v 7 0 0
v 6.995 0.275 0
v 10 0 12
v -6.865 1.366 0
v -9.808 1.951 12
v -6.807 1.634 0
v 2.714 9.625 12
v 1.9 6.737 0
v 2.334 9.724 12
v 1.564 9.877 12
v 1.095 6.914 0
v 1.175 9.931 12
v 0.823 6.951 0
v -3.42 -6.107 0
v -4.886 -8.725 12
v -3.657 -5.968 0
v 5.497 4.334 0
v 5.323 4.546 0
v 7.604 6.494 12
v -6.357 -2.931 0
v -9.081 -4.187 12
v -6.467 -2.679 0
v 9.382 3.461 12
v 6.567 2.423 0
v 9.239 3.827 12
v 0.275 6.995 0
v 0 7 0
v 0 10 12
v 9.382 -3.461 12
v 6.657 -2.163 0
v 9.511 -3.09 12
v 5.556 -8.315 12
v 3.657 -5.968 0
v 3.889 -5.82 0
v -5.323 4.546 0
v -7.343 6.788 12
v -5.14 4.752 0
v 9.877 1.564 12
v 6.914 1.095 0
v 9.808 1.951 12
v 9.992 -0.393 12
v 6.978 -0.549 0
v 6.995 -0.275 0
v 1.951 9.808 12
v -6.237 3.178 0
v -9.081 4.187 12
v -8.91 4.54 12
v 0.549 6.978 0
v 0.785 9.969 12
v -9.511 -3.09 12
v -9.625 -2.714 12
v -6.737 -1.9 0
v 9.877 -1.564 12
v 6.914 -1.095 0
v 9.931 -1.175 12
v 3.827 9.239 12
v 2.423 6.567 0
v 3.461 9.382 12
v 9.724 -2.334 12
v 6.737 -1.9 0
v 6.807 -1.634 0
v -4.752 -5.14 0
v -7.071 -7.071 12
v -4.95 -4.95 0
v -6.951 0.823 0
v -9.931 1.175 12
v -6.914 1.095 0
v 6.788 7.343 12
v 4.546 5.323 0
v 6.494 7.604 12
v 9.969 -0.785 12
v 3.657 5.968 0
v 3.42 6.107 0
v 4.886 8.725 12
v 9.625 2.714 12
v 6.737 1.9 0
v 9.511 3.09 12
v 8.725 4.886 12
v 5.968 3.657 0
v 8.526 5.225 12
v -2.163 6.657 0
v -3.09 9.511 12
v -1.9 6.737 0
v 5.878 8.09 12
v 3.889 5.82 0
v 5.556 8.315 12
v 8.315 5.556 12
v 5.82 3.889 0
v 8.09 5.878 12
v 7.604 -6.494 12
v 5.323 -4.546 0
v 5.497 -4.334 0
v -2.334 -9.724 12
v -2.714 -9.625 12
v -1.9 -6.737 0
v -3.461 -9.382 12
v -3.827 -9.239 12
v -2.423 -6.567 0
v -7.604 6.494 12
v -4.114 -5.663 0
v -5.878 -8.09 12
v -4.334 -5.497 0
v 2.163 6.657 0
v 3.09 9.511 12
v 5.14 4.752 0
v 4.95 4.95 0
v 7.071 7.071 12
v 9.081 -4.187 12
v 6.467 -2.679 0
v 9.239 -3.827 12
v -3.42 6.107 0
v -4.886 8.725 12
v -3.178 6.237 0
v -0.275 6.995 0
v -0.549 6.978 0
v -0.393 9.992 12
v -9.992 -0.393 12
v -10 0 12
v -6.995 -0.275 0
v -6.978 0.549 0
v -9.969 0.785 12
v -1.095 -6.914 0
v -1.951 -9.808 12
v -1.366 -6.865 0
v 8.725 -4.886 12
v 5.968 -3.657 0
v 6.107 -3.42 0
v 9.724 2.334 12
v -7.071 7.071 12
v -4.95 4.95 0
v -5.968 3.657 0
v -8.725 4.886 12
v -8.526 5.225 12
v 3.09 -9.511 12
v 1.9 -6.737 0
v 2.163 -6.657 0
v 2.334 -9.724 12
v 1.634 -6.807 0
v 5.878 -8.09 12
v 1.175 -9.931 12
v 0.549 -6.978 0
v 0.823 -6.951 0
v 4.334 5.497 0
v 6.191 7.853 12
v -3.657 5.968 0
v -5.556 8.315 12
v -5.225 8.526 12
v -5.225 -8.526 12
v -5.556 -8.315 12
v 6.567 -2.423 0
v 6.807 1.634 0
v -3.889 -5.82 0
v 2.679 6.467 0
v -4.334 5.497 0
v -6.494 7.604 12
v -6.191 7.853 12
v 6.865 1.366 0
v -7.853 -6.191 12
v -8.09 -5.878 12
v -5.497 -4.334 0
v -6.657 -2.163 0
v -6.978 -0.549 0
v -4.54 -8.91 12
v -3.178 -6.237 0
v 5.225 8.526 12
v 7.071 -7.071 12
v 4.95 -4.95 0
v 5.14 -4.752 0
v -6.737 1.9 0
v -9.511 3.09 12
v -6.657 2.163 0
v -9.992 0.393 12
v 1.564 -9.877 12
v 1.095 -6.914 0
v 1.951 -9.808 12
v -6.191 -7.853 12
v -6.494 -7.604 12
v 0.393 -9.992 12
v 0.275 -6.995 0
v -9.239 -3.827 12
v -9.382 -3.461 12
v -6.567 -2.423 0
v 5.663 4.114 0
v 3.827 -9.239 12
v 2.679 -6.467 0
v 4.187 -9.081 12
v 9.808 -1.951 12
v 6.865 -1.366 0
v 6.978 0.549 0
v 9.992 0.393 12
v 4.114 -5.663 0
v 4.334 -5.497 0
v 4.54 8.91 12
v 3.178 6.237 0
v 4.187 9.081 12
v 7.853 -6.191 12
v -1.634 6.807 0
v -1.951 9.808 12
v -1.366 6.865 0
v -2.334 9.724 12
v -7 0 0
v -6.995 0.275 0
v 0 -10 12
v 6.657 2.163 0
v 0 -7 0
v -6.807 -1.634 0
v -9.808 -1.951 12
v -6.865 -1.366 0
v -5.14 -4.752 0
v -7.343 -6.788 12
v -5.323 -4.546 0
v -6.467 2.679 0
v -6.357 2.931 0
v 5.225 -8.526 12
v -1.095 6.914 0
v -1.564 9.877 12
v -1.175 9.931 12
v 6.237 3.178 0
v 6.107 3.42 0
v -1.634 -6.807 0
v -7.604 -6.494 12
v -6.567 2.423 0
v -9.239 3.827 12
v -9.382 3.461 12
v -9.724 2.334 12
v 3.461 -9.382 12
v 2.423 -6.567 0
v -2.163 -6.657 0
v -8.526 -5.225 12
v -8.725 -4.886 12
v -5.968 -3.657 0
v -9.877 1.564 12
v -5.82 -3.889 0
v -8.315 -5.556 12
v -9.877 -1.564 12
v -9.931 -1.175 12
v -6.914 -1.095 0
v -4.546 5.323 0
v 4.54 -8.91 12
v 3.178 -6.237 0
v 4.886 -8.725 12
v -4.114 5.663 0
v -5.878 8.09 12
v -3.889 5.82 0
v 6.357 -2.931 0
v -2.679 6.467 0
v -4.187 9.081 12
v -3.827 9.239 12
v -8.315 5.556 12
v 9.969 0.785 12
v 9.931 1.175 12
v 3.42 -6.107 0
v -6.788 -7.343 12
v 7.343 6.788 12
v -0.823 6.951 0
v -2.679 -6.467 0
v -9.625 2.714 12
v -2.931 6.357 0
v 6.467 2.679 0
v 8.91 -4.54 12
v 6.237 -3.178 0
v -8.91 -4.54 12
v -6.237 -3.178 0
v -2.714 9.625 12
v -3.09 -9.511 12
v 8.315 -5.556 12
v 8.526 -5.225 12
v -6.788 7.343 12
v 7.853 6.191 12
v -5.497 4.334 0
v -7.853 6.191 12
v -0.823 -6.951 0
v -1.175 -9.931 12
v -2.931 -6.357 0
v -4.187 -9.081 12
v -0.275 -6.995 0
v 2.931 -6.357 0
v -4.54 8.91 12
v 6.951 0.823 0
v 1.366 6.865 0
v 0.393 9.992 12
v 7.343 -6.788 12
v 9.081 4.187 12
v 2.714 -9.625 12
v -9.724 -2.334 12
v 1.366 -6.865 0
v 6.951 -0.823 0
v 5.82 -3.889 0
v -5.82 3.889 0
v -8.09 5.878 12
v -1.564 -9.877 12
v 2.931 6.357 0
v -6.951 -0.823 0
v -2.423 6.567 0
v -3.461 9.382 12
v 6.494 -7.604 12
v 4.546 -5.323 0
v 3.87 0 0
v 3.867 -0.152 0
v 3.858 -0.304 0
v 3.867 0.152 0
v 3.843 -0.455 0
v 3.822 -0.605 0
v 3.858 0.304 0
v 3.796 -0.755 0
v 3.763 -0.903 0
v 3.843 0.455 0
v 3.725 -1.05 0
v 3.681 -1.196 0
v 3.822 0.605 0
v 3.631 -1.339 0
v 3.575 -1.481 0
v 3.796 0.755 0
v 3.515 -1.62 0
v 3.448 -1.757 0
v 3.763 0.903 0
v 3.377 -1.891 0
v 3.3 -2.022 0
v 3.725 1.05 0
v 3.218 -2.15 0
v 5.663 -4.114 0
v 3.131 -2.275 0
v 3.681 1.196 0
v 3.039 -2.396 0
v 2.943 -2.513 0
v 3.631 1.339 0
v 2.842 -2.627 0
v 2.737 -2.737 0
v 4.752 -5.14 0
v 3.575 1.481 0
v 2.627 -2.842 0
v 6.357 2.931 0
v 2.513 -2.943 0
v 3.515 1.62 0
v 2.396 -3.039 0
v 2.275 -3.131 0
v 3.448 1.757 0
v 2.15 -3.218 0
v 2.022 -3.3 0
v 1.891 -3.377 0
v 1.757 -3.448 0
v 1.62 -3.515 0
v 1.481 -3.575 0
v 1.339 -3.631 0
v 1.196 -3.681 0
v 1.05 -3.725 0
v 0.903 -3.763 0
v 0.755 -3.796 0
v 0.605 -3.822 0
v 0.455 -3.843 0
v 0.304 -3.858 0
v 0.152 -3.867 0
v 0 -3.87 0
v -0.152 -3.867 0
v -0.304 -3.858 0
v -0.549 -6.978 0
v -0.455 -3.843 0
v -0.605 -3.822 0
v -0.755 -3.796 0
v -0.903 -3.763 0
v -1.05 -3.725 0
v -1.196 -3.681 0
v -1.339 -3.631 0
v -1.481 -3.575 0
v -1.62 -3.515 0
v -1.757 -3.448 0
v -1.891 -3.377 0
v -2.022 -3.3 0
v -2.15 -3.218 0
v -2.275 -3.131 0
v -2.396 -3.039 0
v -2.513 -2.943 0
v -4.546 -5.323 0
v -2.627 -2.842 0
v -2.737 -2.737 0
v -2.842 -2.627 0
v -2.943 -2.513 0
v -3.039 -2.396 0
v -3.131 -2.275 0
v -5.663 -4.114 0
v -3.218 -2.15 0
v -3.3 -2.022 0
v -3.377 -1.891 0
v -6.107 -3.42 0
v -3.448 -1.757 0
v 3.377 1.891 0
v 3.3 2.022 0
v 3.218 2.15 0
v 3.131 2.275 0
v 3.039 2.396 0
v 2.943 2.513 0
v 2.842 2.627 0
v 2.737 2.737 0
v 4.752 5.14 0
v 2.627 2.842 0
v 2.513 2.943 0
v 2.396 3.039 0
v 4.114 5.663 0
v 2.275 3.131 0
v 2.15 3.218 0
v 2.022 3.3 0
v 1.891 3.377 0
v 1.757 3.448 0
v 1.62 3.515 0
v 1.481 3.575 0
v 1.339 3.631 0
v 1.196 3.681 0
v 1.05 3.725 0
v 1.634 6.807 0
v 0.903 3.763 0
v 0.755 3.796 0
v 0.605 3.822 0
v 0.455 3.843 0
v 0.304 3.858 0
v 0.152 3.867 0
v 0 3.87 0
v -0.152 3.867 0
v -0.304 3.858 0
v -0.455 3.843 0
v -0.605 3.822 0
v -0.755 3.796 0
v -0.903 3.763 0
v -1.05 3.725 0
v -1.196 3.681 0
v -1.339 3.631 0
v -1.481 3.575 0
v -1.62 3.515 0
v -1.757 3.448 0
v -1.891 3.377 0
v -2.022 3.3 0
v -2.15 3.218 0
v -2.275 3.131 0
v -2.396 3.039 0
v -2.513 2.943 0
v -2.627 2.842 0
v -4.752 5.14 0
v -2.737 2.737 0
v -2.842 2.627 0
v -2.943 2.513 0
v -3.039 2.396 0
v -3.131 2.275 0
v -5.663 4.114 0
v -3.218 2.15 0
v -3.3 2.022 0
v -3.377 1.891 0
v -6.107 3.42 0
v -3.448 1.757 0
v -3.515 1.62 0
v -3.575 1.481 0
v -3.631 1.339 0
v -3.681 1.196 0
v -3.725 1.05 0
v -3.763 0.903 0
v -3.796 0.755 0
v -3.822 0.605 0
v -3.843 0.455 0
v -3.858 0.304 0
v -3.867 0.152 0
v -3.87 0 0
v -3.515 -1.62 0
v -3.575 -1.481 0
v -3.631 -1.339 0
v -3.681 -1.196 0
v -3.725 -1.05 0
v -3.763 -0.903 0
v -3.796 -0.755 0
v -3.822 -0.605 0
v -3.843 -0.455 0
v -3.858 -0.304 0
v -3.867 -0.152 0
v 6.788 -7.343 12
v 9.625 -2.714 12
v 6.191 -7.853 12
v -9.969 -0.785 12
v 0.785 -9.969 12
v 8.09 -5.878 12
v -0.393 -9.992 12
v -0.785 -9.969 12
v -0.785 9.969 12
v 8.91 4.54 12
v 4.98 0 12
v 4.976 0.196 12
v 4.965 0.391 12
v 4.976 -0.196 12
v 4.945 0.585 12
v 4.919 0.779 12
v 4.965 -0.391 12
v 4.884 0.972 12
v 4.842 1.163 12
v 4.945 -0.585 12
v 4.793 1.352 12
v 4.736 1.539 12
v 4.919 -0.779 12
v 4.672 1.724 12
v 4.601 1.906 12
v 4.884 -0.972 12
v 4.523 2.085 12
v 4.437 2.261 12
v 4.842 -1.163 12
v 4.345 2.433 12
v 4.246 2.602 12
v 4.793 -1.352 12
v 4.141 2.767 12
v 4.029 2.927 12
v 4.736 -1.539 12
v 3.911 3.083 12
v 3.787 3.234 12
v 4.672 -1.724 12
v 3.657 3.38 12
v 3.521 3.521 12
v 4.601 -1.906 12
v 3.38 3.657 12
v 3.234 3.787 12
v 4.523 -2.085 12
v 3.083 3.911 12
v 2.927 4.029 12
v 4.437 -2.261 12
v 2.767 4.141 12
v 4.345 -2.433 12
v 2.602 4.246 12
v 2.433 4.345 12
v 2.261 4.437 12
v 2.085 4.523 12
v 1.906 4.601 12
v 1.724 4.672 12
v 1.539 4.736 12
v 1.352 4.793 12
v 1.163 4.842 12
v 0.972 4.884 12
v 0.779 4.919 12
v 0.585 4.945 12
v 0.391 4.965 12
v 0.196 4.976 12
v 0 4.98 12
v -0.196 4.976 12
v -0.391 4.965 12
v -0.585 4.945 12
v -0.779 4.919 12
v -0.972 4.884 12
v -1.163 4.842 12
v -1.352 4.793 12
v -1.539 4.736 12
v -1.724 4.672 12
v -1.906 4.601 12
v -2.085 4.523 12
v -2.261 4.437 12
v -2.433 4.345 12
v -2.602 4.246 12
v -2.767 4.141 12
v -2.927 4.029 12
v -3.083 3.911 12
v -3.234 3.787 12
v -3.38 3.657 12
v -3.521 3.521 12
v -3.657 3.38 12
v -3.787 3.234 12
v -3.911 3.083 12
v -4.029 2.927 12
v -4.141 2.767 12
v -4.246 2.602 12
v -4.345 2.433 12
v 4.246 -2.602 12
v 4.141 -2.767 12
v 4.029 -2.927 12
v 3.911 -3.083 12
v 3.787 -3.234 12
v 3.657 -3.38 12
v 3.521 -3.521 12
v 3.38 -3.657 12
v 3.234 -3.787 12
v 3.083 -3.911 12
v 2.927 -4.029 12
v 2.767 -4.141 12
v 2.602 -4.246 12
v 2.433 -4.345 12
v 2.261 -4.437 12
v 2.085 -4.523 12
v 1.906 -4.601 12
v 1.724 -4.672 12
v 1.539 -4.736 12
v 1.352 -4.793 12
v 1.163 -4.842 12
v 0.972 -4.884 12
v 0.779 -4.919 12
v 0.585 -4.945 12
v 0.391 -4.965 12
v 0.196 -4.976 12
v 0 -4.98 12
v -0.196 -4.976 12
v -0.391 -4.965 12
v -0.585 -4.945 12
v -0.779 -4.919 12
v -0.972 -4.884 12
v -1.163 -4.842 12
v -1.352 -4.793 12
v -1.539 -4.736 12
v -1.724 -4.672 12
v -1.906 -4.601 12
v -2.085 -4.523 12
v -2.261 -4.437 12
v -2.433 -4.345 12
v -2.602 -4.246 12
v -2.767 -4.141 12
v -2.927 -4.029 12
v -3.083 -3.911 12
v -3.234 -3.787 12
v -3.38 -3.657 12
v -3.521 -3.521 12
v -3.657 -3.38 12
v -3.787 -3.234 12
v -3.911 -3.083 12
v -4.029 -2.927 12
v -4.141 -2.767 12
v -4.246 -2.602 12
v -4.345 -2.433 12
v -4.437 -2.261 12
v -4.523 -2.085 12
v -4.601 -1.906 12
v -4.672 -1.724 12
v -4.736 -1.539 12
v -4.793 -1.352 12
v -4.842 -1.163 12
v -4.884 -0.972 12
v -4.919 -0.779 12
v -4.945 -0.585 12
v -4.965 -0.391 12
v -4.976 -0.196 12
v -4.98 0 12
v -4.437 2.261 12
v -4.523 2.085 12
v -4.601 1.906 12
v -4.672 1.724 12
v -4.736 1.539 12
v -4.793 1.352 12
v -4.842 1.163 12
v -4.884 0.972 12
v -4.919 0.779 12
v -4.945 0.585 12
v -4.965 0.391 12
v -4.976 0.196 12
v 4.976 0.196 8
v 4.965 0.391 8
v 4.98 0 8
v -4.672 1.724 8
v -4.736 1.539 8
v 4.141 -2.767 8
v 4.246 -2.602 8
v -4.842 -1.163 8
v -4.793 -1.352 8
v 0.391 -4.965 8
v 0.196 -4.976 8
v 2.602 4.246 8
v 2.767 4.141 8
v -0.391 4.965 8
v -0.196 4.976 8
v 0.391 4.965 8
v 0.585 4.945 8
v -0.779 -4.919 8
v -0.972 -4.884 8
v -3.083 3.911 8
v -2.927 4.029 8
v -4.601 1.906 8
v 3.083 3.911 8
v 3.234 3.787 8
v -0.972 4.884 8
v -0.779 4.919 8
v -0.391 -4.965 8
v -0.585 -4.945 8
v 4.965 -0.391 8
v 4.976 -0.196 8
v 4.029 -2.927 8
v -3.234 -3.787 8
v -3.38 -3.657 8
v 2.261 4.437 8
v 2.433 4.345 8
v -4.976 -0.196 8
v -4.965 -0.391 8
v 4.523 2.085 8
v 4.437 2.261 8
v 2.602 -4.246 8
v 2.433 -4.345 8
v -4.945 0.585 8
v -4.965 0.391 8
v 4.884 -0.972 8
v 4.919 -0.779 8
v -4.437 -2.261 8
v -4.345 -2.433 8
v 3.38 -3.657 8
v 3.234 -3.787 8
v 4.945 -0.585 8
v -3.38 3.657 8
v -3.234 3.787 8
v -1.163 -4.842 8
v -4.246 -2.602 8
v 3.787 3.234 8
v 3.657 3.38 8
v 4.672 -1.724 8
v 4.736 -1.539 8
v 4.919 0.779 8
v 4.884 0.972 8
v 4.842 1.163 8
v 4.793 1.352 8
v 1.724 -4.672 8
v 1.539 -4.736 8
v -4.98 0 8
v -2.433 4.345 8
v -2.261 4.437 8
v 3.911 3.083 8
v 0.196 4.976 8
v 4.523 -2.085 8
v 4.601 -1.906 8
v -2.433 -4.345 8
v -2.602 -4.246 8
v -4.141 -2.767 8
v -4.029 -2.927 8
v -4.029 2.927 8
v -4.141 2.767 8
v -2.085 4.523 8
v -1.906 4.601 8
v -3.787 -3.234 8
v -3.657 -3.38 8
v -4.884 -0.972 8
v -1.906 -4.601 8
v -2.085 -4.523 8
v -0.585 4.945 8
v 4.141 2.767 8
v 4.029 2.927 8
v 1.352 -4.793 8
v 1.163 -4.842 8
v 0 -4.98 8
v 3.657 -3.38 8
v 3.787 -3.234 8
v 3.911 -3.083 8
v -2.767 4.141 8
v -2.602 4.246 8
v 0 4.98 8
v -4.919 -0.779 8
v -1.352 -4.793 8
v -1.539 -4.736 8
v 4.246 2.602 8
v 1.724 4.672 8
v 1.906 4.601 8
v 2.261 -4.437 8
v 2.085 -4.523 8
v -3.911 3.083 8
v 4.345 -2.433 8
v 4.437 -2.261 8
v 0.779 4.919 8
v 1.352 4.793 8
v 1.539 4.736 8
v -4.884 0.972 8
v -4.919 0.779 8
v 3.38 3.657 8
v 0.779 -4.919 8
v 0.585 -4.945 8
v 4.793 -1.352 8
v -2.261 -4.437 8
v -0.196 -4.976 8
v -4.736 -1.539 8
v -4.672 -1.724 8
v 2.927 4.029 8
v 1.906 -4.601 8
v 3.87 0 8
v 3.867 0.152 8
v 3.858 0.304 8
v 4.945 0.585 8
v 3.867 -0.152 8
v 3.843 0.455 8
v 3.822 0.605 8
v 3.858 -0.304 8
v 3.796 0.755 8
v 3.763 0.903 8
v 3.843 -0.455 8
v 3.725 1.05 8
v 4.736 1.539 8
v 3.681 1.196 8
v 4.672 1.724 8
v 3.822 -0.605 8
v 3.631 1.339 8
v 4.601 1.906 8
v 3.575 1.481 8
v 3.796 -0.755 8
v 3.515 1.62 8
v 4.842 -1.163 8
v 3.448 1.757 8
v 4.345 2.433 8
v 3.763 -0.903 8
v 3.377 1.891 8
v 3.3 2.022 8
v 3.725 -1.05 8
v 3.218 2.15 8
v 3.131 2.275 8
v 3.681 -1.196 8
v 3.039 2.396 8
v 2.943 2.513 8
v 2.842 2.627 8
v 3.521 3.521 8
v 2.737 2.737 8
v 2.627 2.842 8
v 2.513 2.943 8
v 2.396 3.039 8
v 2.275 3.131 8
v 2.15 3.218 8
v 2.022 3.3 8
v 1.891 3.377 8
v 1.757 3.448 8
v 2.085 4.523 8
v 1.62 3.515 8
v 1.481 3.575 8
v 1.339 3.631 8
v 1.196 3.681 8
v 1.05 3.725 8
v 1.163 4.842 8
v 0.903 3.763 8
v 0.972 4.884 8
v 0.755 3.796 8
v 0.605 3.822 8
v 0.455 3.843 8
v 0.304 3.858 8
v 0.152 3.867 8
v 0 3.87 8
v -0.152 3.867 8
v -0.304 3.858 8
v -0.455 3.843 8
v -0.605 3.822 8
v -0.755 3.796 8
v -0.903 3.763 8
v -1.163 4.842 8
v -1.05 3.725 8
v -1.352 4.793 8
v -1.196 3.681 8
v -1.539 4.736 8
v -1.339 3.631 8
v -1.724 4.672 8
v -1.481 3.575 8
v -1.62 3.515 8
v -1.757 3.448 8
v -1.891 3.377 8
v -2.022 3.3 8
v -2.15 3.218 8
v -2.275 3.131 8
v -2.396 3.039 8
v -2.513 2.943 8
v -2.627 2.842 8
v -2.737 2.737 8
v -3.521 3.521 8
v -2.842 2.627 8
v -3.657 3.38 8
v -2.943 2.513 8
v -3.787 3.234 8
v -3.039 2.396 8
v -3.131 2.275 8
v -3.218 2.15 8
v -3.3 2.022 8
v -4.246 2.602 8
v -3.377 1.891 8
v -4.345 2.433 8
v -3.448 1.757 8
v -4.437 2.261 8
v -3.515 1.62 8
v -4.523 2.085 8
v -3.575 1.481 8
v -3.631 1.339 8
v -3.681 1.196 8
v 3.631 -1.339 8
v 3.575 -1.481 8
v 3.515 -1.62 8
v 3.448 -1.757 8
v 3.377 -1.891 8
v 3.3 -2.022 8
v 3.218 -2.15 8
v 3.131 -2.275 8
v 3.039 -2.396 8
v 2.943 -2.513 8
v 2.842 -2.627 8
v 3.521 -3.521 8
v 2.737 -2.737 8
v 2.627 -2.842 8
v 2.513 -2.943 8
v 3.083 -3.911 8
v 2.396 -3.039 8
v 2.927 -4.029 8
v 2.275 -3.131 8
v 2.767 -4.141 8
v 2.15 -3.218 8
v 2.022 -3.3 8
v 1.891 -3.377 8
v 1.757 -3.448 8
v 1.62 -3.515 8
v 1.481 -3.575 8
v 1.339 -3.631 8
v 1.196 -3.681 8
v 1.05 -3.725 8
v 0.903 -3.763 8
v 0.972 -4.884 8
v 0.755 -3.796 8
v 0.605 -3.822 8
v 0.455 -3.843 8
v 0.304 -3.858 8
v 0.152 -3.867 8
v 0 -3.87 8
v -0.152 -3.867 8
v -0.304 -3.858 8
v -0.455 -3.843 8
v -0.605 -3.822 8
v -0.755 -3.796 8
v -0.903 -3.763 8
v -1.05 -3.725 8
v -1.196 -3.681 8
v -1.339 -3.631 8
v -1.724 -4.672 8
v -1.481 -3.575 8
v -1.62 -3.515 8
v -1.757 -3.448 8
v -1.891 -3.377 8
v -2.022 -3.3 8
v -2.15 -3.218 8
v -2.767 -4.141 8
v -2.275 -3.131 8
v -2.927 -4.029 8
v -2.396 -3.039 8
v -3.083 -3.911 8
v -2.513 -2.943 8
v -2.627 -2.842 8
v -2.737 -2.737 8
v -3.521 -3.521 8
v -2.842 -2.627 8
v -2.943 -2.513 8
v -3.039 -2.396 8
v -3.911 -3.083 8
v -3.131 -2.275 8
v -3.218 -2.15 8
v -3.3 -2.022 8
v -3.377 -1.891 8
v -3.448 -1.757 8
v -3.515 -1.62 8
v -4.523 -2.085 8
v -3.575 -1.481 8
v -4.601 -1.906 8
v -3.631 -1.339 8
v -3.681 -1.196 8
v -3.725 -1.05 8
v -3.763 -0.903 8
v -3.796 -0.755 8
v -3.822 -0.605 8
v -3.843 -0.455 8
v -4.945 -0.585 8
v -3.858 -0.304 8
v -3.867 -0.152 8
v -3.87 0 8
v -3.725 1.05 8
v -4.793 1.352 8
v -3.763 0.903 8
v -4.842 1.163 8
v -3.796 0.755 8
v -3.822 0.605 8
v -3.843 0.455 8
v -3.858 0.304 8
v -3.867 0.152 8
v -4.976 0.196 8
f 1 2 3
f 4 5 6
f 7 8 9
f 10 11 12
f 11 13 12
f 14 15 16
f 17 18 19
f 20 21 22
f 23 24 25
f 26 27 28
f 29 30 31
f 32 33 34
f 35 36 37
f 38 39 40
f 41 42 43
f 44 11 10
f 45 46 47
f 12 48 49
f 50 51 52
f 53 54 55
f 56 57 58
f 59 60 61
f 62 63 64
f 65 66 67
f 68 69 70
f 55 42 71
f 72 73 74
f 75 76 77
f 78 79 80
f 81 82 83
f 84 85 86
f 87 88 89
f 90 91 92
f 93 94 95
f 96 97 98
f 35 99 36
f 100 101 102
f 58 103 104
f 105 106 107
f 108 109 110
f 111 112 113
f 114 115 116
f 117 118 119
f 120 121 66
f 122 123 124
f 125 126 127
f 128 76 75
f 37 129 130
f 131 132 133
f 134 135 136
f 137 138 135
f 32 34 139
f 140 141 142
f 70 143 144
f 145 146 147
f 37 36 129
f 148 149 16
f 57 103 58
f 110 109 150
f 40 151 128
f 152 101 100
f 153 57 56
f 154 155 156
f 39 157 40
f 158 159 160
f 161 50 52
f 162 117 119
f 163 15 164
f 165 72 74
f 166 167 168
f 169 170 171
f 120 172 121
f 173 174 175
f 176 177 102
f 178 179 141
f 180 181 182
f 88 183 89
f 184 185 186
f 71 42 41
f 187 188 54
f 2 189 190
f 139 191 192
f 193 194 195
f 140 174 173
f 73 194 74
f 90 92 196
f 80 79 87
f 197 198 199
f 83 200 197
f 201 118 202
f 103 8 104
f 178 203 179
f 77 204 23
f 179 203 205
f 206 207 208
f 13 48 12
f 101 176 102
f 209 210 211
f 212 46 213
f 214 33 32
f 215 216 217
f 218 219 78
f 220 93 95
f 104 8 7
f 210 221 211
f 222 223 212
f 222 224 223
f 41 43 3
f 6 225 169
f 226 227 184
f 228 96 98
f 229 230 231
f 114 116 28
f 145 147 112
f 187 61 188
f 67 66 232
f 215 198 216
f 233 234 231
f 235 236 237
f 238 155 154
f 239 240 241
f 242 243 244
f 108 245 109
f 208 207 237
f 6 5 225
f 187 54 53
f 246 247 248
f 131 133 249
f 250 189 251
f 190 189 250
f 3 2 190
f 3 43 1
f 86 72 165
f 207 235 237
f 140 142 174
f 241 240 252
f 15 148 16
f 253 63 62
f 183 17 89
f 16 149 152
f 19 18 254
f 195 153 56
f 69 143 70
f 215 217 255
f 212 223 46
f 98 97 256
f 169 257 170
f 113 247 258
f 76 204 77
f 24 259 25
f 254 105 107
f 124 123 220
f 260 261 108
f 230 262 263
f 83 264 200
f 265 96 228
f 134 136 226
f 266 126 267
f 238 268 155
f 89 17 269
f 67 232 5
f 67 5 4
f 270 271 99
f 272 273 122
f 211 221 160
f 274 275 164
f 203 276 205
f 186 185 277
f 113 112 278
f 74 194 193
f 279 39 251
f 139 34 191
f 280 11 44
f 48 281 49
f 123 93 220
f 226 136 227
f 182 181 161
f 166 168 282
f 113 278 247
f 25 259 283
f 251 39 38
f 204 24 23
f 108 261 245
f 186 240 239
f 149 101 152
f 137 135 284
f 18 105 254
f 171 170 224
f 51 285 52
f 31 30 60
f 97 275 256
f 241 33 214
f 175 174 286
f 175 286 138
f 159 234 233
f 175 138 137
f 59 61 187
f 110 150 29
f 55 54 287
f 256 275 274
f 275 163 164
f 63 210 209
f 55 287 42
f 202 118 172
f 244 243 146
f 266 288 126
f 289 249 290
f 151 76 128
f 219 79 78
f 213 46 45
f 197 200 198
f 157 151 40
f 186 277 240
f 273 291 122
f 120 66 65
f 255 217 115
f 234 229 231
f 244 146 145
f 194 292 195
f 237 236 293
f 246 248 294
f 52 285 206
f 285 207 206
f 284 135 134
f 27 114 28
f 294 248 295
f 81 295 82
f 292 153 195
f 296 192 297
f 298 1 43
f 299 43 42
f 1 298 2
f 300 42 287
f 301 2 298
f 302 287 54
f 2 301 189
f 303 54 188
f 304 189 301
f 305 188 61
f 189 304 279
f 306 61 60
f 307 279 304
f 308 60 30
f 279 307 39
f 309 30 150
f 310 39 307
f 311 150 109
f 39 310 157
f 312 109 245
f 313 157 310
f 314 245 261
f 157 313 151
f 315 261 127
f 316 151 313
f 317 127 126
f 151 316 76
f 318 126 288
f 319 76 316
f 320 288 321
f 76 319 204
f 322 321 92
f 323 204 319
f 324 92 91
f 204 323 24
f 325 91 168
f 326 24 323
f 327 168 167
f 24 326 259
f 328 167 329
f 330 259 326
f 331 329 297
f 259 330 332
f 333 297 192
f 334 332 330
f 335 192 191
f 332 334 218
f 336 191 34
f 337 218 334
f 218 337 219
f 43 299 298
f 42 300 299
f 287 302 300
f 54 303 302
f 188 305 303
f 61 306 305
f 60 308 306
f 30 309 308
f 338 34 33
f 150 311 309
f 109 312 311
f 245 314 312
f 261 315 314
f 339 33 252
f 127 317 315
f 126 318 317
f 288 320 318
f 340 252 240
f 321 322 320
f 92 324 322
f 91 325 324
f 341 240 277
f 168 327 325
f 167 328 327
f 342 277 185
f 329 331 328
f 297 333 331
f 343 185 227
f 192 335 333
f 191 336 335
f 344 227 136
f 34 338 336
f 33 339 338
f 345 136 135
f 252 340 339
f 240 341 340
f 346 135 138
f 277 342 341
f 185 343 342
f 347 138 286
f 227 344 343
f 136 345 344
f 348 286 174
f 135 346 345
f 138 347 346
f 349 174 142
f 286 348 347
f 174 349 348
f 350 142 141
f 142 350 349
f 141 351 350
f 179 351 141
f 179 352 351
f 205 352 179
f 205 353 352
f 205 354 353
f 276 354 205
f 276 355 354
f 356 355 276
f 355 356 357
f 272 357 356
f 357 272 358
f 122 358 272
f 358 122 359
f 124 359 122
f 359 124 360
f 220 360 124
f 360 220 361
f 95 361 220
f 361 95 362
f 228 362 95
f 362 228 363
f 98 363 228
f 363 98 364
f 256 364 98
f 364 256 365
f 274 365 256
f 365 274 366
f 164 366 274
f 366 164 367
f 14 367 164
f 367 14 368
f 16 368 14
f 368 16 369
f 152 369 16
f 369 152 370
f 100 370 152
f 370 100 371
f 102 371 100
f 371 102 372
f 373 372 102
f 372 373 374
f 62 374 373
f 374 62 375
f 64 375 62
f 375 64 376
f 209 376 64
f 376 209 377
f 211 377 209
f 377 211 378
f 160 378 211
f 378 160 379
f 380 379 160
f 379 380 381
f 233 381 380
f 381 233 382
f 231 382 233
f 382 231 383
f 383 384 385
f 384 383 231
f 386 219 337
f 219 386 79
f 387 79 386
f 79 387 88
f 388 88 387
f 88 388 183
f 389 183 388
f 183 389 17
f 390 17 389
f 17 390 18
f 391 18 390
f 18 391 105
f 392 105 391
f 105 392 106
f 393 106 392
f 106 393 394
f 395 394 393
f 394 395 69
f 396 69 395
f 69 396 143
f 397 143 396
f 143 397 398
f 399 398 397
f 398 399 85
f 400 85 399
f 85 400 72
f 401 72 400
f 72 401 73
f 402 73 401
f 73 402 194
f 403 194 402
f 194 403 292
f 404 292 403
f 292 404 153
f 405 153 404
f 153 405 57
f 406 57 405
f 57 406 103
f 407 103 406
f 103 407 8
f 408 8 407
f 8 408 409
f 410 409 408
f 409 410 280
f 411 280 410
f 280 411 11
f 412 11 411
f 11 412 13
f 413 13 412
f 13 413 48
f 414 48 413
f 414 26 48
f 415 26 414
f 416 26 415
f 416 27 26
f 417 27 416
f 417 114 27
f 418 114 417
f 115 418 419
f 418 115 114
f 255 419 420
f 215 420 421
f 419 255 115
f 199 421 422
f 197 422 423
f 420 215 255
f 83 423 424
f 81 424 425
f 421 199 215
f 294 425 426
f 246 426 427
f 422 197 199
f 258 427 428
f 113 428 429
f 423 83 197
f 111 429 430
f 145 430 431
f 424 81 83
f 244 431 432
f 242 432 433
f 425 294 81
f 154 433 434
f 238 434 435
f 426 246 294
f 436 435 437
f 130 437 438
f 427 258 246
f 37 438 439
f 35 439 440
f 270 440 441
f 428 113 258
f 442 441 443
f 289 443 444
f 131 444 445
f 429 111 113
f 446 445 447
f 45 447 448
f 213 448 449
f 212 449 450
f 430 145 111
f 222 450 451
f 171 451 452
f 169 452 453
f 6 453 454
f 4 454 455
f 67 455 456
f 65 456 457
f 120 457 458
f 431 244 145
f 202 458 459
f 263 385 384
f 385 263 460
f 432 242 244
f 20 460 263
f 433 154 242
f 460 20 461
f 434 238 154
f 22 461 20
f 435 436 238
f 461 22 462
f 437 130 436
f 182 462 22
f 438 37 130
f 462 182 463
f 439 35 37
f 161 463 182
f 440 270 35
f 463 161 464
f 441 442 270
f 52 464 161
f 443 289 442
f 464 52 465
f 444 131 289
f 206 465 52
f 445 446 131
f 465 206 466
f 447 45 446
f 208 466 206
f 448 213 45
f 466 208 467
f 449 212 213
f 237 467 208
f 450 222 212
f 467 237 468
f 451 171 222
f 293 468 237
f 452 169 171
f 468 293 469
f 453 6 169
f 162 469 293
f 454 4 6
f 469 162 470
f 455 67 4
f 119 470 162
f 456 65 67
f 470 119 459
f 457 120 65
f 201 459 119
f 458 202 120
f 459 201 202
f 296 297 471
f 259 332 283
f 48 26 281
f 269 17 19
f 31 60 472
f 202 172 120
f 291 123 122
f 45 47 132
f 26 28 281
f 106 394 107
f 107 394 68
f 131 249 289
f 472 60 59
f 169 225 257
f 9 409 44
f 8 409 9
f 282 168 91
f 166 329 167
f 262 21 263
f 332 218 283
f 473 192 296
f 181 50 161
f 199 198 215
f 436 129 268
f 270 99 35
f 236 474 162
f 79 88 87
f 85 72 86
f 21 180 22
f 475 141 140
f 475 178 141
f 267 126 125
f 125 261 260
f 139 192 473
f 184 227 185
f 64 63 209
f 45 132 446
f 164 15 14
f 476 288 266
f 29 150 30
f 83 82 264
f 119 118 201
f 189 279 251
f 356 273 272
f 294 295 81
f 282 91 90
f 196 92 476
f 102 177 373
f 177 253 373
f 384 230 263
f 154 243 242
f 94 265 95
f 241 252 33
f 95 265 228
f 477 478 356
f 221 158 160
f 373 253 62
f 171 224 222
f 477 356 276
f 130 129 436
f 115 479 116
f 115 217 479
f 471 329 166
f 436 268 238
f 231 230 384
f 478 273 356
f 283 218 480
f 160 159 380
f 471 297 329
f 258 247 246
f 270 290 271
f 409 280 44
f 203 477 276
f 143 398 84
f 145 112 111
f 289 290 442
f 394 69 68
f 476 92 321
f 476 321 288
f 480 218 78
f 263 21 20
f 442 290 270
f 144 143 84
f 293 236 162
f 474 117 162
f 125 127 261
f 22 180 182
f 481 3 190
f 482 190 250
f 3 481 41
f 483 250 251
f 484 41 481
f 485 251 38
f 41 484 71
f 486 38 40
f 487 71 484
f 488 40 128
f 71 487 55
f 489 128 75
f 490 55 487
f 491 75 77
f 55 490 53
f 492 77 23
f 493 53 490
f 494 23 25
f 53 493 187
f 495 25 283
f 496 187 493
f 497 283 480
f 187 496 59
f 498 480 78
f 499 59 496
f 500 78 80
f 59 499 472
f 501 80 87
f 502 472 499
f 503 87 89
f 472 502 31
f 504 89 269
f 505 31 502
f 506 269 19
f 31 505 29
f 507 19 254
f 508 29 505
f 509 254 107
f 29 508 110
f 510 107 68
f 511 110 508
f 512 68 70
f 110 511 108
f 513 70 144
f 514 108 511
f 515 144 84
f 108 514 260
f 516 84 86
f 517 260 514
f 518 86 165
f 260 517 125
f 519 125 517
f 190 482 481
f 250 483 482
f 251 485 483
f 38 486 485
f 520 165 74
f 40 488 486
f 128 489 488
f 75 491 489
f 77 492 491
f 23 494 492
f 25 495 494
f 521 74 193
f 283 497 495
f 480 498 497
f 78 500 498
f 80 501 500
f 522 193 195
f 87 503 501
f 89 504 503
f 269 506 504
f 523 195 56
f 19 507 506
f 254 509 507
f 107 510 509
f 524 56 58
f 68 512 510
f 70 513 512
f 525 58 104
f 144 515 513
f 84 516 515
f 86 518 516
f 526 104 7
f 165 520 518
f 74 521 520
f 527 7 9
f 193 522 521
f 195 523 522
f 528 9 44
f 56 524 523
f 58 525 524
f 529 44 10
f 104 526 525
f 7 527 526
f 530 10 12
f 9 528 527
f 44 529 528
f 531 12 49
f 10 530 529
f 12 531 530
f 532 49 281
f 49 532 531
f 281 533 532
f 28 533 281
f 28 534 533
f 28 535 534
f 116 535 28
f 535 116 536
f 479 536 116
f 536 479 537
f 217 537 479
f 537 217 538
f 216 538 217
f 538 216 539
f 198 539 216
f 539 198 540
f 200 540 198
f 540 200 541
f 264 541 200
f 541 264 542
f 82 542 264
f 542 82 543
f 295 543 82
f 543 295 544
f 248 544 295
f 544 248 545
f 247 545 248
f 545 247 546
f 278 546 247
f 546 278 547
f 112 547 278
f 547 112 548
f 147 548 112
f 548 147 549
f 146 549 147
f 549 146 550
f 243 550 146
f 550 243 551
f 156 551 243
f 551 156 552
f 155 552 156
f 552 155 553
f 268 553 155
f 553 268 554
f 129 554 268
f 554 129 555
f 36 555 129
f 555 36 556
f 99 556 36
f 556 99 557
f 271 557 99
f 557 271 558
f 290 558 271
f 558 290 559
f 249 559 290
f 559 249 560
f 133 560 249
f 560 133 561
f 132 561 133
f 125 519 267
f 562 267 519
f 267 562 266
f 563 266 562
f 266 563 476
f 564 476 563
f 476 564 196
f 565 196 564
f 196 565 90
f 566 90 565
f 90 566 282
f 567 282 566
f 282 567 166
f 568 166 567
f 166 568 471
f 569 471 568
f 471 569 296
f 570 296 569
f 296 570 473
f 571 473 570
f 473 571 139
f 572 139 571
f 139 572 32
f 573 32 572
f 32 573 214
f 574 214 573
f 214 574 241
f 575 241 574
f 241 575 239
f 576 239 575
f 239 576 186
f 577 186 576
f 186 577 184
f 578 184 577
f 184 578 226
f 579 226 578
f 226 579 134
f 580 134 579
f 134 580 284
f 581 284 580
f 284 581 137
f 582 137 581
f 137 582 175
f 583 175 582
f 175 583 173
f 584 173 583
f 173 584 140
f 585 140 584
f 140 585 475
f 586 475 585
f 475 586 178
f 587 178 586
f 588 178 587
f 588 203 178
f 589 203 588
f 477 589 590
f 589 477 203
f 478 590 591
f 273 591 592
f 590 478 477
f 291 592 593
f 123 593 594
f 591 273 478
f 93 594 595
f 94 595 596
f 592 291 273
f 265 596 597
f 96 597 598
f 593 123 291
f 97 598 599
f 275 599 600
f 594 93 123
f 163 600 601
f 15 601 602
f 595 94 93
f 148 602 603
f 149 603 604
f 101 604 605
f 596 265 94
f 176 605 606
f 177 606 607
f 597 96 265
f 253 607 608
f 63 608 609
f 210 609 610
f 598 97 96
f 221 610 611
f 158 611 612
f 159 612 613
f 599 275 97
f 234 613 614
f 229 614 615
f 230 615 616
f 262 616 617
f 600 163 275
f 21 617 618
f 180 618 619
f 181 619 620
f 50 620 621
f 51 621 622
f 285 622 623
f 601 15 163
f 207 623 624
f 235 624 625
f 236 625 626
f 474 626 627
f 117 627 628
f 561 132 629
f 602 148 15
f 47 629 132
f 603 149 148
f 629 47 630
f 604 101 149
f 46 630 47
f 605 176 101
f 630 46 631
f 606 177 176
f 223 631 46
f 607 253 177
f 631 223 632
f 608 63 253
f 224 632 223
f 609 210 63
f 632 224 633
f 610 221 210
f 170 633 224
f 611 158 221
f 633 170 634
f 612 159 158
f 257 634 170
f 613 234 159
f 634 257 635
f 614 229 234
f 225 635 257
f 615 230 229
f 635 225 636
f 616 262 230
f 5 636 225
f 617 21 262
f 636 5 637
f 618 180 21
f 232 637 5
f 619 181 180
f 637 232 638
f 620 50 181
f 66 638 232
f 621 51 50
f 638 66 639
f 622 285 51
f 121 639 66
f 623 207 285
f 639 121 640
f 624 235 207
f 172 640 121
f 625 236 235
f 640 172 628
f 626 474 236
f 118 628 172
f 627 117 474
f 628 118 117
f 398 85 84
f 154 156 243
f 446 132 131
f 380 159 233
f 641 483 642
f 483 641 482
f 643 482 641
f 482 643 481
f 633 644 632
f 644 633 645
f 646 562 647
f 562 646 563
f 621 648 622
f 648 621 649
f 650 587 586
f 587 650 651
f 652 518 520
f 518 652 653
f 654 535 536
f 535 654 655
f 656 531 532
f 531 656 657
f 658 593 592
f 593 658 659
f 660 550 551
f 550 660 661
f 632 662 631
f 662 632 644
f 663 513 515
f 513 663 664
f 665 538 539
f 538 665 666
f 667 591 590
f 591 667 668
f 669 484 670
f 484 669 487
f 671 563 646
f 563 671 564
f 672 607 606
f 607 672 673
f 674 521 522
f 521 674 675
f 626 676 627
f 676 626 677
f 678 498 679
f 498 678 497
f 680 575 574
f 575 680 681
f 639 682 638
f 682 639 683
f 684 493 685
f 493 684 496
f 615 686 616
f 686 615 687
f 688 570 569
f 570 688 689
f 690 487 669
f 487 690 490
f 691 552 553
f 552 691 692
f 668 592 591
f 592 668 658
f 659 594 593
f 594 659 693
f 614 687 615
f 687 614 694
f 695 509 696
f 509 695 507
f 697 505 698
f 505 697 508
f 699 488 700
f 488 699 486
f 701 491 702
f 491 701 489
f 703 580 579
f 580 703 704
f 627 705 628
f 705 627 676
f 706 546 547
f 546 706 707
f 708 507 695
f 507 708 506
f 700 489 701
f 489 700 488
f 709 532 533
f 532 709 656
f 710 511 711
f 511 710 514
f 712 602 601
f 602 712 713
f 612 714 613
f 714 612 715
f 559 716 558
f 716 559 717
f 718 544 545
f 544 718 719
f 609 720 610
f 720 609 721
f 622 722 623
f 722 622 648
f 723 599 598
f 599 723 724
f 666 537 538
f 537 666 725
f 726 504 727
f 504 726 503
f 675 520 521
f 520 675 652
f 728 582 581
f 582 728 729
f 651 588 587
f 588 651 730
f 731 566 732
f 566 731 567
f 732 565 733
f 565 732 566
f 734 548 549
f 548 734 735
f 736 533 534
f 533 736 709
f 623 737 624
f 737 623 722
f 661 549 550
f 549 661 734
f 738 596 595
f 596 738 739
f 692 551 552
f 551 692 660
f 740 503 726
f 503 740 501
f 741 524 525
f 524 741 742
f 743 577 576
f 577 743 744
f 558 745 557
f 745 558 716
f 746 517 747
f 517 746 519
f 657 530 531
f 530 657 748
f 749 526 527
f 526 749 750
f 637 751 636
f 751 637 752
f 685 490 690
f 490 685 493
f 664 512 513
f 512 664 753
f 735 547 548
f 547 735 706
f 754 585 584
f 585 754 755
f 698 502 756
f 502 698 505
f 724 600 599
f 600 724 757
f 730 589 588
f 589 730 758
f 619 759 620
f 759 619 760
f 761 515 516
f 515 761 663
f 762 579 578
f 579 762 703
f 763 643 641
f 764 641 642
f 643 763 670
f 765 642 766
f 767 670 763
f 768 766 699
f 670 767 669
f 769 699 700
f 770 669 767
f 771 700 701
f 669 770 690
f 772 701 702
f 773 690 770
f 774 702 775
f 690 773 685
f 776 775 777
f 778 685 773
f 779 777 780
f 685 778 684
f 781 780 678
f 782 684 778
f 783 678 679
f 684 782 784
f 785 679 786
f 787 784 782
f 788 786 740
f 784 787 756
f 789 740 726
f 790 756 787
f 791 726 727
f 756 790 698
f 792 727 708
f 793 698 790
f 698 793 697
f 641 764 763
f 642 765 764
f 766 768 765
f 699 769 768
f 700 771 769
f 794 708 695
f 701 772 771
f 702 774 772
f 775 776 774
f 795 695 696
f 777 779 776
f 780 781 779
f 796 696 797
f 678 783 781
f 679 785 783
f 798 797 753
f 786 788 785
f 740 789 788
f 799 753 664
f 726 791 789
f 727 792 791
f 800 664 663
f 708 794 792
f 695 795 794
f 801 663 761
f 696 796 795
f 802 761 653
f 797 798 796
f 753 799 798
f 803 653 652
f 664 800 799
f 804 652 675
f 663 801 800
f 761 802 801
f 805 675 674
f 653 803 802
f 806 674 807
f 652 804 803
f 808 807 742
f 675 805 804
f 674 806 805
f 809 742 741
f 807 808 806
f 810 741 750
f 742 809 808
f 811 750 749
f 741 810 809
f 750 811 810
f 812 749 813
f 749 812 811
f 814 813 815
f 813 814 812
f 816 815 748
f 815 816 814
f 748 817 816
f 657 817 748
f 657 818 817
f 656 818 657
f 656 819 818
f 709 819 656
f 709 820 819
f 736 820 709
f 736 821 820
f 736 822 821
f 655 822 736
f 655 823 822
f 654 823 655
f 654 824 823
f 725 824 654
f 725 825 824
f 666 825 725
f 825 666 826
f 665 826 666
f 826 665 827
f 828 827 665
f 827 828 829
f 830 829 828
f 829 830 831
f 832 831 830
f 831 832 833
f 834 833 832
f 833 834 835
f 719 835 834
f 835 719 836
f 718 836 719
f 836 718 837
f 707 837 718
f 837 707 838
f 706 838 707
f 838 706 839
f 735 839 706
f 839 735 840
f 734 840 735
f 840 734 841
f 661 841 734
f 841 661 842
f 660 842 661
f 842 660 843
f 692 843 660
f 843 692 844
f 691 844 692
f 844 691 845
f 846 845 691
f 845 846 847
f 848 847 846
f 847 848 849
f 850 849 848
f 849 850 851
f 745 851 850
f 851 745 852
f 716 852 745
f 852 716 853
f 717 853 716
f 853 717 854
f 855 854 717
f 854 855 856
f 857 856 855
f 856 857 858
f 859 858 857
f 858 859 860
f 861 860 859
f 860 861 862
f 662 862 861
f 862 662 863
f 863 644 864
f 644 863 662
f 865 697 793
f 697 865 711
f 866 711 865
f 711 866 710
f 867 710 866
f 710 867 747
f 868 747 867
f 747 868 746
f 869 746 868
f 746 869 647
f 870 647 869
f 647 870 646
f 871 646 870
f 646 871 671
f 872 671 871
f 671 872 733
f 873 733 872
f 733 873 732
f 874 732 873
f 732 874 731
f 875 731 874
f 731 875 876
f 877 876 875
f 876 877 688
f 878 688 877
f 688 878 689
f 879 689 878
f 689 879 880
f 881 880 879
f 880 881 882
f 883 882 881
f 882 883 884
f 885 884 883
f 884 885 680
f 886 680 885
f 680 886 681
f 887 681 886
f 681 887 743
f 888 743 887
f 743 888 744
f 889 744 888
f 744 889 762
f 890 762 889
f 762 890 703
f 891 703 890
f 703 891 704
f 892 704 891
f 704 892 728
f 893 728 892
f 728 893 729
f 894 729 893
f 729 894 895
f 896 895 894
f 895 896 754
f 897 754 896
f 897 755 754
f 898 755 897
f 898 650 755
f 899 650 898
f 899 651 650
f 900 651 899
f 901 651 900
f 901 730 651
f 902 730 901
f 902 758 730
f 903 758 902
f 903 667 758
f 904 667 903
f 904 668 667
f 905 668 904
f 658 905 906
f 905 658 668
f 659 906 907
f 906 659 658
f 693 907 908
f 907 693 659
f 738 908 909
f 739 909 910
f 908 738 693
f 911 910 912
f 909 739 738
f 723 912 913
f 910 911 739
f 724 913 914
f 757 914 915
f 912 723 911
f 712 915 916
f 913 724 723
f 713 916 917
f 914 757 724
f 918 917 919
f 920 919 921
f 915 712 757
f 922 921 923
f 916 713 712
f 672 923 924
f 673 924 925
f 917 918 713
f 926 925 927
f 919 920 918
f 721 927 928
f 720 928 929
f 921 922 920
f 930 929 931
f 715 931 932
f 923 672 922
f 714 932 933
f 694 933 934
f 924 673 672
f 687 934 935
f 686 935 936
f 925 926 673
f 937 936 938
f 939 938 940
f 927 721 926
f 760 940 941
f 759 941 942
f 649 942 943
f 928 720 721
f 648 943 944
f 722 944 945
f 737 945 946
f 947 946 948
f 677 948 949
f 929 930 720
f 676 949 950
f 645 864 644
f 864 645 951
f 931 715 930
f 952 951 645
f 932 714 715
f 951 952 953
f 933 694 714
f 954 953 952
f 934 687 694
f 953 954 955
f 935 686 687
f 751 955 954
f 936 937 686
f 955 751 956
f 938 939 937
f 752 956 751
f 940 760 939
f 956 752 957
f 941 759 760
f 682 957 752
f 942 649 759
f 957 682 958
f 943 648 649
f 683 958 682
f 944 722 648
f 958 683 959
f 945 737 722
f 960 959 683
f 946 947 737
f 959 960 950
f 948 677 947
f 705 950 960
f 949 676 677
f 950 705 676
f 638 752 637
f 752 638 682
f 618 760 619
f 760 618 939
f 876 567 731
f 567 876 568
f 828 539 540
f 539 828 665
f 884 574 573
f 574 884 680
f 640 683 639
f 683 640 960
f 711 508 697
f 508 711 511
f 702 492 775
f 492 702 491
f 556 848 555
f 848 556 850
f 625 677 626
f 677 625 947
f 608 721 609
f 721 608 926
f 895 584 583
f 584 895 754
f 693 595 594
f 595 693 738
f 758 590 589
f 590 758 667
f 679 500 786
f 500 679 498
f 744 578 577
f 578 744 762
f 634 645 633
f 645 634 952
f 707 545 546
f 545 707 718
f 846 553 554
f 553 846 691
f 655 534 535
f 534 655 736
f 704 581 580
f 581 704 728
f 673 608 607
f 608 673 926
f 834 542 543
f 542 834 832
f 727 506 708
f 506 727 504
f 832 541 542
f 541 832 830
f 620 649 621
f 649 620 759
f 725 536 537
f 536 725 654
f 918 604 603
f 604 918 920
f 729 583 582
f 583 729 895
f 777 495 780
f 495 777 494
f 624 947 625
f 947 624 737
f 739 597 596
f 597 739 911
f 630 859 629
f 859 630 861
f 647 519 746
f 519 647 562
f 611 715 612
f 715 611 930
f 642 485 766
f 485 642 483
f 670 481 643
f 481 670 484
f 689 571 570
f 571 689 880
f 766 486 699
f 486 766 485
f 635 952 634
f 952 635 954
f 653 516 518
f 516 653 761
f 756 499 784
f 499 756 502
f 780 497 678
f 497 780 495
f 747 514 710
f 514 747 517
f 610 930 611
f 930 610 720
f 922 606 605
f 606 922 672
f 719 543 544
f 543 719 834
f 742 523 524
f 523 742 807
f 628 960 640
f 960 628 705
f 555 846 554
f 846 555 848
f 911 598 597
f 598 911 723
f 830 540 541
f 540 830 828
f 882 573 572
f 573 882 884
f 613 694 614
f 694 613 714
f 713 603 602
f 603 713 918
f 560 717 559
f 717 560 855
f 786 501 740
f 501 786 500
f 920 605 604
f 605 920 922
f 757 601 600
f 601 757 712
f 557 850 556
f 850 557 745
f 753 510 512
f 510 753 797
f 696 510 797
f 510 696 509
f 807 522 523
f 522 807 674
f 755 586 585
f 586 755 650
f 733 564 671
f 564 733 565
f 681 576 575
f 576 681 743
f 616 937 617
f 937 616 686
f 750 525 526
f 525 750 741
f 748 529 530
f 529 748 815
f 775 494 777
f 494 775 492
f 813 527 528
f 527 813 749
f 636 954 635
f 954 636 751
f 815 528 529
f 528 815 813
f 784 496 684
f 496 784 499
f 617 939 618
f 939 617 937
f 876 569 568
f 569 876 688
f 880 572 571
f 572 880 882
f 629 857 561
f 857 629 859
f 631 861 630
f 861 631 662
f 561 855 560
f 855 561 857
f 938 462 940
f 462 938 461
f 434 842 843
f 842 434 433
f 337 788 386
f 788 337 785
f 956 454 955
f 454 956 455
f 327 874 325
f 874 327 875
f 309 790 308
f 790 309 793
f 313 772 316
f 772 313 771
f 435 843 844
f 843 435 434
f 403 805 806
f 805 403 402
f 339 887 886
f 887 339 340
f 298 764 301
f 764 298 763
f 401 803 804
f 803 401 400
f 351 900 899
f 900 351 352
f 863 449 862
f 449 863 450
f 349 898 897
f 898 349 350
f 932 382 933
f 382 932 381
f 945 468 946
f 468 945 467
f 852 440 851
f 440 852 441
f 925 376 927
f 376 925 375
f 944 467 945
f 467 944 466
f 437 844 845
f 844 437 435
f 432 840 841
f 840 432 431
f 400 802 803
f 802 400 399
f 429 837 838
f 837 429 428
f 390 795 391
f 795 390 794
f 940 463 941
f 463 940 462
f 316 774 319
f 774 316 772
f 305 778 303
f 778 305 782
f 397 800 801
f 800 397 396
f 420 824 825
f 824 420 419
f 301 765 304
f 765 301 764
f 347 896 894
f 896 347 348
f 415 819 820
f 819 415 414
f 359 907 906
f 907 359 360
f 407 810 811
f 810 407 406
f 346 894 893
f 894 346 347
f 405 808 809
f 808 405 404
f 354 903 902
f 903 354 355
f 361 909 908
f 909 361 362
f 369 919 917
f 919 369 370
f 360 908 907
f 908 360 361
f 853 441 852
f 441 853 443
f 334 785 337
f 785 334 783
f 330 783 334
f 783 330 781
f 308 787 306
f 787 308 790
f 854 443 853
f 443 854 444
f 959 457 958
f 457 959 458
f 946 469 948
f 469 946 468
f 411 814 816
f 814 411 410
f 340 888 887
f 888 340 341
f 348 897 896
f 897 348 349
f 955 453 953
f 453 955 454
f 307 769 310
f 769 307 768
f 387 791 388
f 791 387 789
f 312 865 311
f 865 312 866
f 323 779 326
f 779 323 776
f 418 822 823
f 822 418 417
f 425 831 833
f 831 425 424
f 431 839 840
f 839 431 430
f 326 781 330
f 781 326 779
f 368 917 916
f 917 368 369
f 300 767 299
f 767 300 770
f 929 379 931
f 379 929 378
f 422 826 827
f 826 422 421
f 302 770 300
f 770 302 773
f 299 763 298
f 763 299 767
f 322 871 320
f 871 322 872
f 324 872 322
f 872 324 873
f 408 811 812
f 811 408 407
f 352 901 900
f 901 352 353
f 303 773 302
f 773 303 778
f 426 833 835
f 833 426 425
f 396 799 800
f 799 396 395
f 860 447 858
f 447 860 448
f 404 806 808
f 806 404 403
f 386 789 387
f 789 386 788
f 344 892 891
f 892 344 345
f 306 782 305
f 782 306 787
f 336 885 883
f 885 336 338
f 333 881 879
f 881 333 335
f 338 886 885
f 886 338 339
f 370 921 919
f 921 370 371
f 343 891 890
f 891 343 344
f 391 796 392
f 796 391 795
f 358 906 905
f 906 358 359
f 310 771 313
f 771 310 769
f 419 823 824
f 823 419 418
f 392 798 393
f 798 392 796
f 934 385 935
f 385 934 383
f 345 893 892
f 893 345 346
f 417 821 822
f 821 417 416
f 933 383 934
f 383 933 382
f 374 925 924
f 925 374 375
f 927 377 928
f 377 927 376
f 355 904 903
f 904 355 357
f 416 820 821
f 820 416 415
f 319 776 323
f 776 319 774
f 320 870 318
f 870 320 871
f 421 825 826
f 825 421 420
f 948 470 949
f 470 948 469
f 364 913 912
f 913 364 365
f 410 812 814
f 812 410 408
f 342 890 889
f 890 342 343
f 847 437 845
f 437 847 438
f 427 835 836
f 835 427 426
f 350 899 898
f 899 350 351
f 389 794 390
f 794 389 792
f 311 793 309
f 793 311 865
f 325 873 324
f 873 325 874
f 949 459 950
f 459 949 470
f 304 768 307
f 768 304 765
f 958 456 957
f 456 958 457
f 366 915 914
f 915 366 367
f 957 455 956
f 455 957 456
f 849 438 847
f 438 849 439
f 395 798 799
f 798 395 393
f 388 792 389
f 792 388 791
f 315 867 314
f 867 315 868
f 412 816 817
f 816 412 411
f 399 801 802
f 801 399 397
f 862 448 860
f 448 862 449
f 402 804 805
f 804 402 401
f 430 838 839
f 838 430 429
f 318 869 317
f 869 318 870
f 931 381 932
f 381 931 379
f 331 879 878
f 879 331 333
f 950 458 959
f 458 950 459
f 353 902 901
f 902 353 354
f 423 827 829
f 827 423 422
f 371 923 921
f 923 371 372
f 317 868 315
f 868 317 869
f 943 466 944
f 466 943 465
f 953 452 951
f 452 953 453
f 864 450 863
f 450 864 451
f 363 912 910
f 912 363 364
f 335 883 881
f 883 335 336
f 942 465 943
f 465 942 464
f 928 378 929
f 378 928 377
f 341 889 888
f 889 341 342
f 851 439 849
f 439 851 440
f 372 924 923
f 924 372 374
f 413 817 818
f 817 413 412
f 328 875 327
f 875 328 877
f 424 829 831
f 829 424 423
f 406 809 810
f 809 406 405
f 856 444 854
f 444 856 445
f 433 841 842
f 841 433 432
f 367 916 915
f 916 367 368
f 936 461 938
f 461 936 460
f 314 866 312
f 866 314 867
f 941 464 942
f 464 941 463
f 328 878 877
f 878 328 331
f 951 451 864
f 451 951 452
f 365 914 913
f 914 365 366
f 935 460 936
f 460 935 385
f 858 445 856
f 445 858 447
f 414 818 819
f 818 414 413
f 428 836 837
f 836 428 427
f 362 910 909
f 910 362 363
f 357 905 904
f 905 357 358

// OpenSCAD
// PCM-M10 capsule test-jig — capsule holder / acoustic coupler end
// Units: mm.  Capsule drops into the top well, rests on the shoulder
// with its front inlet facing the bore; sound enters from the bottom.

/* ---------- parameters ---------- */
capsule_dia   = 9.96;  // capsule bore (AOM-5024L = 9.70, +0.02 slip clearance)
well_depth    = 4;     // depth of capsule well (this floor is the stop)
bore_dia      = 7.74;   // inner acoustic channel
bore_len      = 8;     // channel length below the well   <- tweak

outer_top_dia = 20;    // body OD at capsule (top) end     <- guessed, tweak
outer_bot_dia = 14;    // body OD at source (bottom) end   <- guessed, tweak

eps = 0.05;            // boolean overlap fudge
$fn = 160;             // circle smoothness

/* ---------- derived ---------- */
total_h = well_depth + bore_len;

/* ---------- model ---------- */
difference() {
    // tapered outer body (wide at the capsule end)
    cylinder(h = total_h, d1 = outer_bot_dia, d2 = outer_top_dia);

    // capsule well cut from the top; its floor is the stop shoulder
    translate([0, 0, total_h - well_depth])
        cylinder(h = well_depth + eps, d = capsule_dia);

    // acoustic channel, open at the bottom, meeting the well floor
    translate([0, 0, -eps])
        cylinder(h = bore_len + eps, d = bore_dia);
}
